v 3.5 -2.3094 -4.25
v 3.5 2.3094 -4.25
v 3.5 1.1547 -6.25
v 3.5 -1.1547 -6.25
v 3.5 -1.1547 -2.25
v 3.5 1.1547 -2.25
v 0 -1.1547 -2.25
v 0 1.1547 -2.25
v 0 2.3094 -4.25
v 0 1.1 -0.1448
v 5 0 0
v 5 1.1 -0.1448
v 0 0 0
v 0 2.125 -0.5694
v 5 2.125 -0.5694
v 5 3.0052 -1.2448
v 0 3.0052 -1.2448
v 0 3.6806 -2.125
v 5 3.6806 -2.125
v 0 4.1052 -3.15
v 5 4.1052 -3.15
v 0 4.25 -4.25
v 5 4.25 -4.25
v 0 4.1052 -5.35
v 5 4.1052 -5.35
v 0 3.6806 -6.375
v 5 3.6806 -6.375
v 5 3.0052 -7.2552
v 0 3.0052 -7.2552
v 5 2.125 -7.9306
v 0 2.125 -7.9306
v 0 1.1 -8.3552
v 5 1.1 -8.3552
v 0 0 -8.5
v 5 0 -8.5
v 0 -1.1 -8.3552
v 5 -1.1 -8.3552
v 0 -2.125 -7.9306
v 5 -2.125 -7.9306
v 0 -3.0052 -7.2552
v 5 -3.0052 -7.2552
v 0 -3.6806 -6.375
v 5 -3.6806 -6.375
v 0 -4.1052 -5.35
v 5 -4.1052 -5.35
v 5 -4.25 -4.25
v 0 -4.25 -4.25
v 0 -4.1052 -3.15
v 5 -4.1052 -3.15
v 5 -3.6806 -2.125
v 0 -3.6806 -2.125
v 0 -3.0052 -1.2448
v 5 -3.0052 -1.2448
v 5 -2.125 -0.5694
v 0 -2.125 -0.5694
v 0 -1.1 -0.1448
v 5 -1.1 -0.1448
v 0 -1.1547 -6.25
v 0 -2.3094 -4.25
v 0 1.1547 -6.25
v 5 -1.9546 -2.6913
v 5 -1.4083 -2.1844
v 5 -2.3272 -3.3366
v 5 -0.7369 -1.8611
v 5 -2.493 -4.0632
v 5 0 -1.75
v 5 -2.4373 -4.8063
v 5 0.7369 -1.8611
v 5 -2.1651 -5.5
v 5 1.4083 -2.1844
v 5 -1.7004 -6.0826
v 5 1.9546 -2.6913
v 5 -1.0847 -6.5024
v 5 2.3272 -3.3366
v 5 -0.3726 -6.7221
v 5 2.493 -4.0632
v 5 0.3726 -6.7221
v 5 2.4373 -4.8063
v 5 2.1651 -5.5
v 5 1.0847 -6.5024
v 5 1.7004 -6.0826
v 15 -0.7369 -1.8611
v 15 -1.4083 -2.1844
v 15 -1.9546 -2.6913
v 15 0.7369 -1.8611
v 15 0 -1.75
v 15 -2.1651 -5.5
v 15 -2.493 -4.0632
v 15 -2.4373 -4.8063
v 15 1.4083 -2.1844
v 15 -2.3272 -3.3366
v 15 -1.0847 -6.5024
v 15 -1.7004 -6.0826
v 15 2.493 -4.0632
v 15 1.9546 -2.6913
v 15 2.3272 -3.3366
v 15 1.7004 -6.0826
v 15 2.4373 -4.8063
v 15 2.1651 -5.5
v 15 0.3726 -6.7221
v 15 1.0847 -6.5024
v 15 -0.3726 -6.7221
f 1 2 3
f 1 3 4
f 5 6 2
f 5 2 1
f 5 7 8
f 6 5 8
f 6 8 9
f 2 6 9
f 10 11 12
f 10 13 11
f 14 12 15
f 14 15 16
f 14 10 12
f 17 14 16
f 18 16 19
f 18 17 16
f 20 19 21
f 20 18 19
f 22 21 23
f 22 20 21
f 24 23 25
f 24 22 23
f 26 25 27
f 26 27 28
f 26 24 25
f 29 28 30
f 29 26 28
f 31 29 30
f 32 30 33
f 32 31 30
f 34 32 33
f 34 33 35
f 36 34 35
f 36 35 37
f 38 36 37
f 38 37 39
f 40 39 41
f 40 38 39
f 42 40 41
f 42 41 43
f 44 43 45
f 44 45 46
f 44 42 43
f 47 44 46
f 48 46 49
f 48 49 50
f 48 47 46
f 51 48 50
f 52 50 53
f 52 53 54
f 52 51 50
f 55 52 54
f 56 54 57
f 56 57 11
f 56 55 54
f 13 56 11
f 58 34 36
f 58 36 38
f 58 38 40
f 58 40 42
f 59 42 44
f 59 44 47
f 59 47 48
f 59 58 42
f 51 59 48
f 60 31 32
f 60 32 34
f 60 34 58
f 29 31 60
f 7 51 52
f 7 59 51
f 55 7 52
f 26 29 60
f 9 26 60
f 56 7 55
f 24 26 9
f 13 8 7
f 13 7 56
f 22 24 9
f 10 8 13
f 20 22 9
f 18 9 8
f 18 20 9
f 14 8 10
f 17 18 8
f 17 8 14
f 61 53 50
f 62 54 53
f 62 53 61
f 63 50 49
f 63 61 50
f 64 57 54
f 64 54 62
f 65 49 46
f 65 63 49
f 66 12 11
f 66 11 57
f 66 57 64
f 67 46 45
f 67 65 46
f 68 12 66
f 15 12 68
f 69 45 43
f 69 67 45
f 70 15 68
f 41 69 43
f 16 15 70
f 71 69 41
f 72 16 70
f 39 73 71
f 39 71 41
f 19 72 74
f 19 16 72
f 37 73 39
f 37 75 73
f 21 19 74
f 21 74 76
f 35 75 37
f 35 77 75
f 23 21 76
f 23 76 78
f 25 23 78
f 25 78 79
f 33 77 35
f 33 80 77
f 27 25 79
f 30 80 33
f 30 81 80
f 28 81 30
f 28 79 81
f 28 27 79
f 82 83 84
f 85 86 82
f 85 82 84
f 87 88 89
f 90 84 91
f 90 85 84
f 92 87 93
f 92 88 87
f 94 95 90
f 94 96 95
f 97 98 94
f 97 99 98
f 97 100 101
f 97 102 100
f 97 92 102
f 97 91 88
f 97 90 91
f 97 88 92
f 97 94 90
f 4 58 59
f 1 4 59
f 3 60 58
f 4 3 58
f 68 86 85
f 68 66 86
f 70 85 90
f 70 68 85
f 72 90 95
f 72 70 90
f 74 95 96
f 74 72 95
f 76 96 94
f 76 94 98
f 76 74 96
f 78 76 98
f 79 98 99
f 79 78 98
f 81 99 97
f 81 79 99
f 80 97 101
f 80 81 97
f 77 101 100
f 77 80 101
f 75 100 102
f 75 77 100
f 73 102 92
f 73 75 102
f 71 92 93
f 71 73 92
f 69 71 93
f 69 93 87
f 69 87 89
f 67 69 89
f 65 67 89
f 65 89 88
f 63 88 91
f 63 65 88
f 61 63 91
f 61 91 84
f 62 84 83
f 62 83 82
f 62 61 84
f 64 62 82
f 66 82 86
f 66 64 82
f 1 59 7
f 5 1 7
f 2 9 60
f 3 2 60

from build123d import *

# Parameters (mm, degrees)
F3_DEPTH = 3.5


with BuildPart() as f1:
    # F0 (on Front) → F1 (revolve)
    with BuildSketch(Plane.XZ):
        Polygon((5, 0), (0, 0), (0, -4.25), (15, -4.25), (15, -1.75), (5, -1.75), align=None)
    revolve(axis=Axis((7.5, 0, -4.25), (-1, 0, 0)))

    # F2 (on face) → F3 (cut)
    with BuildSketch(Plane(origin=(0, 0, 0), x_dir=(0, -1, 0), z_dir=(-1, 0, 0))):
        Polygon((1.154701, -2.25), (-1.154701, -2.25), (-2.309401, -4.25), (-1.154701, -6.25), (1.154701, -6.25), (2.309401, -4.25), align=None)
    extrude(amount=-F3_DEPTH, mode=Mode.SUBTRACT)


solid = f1.part
